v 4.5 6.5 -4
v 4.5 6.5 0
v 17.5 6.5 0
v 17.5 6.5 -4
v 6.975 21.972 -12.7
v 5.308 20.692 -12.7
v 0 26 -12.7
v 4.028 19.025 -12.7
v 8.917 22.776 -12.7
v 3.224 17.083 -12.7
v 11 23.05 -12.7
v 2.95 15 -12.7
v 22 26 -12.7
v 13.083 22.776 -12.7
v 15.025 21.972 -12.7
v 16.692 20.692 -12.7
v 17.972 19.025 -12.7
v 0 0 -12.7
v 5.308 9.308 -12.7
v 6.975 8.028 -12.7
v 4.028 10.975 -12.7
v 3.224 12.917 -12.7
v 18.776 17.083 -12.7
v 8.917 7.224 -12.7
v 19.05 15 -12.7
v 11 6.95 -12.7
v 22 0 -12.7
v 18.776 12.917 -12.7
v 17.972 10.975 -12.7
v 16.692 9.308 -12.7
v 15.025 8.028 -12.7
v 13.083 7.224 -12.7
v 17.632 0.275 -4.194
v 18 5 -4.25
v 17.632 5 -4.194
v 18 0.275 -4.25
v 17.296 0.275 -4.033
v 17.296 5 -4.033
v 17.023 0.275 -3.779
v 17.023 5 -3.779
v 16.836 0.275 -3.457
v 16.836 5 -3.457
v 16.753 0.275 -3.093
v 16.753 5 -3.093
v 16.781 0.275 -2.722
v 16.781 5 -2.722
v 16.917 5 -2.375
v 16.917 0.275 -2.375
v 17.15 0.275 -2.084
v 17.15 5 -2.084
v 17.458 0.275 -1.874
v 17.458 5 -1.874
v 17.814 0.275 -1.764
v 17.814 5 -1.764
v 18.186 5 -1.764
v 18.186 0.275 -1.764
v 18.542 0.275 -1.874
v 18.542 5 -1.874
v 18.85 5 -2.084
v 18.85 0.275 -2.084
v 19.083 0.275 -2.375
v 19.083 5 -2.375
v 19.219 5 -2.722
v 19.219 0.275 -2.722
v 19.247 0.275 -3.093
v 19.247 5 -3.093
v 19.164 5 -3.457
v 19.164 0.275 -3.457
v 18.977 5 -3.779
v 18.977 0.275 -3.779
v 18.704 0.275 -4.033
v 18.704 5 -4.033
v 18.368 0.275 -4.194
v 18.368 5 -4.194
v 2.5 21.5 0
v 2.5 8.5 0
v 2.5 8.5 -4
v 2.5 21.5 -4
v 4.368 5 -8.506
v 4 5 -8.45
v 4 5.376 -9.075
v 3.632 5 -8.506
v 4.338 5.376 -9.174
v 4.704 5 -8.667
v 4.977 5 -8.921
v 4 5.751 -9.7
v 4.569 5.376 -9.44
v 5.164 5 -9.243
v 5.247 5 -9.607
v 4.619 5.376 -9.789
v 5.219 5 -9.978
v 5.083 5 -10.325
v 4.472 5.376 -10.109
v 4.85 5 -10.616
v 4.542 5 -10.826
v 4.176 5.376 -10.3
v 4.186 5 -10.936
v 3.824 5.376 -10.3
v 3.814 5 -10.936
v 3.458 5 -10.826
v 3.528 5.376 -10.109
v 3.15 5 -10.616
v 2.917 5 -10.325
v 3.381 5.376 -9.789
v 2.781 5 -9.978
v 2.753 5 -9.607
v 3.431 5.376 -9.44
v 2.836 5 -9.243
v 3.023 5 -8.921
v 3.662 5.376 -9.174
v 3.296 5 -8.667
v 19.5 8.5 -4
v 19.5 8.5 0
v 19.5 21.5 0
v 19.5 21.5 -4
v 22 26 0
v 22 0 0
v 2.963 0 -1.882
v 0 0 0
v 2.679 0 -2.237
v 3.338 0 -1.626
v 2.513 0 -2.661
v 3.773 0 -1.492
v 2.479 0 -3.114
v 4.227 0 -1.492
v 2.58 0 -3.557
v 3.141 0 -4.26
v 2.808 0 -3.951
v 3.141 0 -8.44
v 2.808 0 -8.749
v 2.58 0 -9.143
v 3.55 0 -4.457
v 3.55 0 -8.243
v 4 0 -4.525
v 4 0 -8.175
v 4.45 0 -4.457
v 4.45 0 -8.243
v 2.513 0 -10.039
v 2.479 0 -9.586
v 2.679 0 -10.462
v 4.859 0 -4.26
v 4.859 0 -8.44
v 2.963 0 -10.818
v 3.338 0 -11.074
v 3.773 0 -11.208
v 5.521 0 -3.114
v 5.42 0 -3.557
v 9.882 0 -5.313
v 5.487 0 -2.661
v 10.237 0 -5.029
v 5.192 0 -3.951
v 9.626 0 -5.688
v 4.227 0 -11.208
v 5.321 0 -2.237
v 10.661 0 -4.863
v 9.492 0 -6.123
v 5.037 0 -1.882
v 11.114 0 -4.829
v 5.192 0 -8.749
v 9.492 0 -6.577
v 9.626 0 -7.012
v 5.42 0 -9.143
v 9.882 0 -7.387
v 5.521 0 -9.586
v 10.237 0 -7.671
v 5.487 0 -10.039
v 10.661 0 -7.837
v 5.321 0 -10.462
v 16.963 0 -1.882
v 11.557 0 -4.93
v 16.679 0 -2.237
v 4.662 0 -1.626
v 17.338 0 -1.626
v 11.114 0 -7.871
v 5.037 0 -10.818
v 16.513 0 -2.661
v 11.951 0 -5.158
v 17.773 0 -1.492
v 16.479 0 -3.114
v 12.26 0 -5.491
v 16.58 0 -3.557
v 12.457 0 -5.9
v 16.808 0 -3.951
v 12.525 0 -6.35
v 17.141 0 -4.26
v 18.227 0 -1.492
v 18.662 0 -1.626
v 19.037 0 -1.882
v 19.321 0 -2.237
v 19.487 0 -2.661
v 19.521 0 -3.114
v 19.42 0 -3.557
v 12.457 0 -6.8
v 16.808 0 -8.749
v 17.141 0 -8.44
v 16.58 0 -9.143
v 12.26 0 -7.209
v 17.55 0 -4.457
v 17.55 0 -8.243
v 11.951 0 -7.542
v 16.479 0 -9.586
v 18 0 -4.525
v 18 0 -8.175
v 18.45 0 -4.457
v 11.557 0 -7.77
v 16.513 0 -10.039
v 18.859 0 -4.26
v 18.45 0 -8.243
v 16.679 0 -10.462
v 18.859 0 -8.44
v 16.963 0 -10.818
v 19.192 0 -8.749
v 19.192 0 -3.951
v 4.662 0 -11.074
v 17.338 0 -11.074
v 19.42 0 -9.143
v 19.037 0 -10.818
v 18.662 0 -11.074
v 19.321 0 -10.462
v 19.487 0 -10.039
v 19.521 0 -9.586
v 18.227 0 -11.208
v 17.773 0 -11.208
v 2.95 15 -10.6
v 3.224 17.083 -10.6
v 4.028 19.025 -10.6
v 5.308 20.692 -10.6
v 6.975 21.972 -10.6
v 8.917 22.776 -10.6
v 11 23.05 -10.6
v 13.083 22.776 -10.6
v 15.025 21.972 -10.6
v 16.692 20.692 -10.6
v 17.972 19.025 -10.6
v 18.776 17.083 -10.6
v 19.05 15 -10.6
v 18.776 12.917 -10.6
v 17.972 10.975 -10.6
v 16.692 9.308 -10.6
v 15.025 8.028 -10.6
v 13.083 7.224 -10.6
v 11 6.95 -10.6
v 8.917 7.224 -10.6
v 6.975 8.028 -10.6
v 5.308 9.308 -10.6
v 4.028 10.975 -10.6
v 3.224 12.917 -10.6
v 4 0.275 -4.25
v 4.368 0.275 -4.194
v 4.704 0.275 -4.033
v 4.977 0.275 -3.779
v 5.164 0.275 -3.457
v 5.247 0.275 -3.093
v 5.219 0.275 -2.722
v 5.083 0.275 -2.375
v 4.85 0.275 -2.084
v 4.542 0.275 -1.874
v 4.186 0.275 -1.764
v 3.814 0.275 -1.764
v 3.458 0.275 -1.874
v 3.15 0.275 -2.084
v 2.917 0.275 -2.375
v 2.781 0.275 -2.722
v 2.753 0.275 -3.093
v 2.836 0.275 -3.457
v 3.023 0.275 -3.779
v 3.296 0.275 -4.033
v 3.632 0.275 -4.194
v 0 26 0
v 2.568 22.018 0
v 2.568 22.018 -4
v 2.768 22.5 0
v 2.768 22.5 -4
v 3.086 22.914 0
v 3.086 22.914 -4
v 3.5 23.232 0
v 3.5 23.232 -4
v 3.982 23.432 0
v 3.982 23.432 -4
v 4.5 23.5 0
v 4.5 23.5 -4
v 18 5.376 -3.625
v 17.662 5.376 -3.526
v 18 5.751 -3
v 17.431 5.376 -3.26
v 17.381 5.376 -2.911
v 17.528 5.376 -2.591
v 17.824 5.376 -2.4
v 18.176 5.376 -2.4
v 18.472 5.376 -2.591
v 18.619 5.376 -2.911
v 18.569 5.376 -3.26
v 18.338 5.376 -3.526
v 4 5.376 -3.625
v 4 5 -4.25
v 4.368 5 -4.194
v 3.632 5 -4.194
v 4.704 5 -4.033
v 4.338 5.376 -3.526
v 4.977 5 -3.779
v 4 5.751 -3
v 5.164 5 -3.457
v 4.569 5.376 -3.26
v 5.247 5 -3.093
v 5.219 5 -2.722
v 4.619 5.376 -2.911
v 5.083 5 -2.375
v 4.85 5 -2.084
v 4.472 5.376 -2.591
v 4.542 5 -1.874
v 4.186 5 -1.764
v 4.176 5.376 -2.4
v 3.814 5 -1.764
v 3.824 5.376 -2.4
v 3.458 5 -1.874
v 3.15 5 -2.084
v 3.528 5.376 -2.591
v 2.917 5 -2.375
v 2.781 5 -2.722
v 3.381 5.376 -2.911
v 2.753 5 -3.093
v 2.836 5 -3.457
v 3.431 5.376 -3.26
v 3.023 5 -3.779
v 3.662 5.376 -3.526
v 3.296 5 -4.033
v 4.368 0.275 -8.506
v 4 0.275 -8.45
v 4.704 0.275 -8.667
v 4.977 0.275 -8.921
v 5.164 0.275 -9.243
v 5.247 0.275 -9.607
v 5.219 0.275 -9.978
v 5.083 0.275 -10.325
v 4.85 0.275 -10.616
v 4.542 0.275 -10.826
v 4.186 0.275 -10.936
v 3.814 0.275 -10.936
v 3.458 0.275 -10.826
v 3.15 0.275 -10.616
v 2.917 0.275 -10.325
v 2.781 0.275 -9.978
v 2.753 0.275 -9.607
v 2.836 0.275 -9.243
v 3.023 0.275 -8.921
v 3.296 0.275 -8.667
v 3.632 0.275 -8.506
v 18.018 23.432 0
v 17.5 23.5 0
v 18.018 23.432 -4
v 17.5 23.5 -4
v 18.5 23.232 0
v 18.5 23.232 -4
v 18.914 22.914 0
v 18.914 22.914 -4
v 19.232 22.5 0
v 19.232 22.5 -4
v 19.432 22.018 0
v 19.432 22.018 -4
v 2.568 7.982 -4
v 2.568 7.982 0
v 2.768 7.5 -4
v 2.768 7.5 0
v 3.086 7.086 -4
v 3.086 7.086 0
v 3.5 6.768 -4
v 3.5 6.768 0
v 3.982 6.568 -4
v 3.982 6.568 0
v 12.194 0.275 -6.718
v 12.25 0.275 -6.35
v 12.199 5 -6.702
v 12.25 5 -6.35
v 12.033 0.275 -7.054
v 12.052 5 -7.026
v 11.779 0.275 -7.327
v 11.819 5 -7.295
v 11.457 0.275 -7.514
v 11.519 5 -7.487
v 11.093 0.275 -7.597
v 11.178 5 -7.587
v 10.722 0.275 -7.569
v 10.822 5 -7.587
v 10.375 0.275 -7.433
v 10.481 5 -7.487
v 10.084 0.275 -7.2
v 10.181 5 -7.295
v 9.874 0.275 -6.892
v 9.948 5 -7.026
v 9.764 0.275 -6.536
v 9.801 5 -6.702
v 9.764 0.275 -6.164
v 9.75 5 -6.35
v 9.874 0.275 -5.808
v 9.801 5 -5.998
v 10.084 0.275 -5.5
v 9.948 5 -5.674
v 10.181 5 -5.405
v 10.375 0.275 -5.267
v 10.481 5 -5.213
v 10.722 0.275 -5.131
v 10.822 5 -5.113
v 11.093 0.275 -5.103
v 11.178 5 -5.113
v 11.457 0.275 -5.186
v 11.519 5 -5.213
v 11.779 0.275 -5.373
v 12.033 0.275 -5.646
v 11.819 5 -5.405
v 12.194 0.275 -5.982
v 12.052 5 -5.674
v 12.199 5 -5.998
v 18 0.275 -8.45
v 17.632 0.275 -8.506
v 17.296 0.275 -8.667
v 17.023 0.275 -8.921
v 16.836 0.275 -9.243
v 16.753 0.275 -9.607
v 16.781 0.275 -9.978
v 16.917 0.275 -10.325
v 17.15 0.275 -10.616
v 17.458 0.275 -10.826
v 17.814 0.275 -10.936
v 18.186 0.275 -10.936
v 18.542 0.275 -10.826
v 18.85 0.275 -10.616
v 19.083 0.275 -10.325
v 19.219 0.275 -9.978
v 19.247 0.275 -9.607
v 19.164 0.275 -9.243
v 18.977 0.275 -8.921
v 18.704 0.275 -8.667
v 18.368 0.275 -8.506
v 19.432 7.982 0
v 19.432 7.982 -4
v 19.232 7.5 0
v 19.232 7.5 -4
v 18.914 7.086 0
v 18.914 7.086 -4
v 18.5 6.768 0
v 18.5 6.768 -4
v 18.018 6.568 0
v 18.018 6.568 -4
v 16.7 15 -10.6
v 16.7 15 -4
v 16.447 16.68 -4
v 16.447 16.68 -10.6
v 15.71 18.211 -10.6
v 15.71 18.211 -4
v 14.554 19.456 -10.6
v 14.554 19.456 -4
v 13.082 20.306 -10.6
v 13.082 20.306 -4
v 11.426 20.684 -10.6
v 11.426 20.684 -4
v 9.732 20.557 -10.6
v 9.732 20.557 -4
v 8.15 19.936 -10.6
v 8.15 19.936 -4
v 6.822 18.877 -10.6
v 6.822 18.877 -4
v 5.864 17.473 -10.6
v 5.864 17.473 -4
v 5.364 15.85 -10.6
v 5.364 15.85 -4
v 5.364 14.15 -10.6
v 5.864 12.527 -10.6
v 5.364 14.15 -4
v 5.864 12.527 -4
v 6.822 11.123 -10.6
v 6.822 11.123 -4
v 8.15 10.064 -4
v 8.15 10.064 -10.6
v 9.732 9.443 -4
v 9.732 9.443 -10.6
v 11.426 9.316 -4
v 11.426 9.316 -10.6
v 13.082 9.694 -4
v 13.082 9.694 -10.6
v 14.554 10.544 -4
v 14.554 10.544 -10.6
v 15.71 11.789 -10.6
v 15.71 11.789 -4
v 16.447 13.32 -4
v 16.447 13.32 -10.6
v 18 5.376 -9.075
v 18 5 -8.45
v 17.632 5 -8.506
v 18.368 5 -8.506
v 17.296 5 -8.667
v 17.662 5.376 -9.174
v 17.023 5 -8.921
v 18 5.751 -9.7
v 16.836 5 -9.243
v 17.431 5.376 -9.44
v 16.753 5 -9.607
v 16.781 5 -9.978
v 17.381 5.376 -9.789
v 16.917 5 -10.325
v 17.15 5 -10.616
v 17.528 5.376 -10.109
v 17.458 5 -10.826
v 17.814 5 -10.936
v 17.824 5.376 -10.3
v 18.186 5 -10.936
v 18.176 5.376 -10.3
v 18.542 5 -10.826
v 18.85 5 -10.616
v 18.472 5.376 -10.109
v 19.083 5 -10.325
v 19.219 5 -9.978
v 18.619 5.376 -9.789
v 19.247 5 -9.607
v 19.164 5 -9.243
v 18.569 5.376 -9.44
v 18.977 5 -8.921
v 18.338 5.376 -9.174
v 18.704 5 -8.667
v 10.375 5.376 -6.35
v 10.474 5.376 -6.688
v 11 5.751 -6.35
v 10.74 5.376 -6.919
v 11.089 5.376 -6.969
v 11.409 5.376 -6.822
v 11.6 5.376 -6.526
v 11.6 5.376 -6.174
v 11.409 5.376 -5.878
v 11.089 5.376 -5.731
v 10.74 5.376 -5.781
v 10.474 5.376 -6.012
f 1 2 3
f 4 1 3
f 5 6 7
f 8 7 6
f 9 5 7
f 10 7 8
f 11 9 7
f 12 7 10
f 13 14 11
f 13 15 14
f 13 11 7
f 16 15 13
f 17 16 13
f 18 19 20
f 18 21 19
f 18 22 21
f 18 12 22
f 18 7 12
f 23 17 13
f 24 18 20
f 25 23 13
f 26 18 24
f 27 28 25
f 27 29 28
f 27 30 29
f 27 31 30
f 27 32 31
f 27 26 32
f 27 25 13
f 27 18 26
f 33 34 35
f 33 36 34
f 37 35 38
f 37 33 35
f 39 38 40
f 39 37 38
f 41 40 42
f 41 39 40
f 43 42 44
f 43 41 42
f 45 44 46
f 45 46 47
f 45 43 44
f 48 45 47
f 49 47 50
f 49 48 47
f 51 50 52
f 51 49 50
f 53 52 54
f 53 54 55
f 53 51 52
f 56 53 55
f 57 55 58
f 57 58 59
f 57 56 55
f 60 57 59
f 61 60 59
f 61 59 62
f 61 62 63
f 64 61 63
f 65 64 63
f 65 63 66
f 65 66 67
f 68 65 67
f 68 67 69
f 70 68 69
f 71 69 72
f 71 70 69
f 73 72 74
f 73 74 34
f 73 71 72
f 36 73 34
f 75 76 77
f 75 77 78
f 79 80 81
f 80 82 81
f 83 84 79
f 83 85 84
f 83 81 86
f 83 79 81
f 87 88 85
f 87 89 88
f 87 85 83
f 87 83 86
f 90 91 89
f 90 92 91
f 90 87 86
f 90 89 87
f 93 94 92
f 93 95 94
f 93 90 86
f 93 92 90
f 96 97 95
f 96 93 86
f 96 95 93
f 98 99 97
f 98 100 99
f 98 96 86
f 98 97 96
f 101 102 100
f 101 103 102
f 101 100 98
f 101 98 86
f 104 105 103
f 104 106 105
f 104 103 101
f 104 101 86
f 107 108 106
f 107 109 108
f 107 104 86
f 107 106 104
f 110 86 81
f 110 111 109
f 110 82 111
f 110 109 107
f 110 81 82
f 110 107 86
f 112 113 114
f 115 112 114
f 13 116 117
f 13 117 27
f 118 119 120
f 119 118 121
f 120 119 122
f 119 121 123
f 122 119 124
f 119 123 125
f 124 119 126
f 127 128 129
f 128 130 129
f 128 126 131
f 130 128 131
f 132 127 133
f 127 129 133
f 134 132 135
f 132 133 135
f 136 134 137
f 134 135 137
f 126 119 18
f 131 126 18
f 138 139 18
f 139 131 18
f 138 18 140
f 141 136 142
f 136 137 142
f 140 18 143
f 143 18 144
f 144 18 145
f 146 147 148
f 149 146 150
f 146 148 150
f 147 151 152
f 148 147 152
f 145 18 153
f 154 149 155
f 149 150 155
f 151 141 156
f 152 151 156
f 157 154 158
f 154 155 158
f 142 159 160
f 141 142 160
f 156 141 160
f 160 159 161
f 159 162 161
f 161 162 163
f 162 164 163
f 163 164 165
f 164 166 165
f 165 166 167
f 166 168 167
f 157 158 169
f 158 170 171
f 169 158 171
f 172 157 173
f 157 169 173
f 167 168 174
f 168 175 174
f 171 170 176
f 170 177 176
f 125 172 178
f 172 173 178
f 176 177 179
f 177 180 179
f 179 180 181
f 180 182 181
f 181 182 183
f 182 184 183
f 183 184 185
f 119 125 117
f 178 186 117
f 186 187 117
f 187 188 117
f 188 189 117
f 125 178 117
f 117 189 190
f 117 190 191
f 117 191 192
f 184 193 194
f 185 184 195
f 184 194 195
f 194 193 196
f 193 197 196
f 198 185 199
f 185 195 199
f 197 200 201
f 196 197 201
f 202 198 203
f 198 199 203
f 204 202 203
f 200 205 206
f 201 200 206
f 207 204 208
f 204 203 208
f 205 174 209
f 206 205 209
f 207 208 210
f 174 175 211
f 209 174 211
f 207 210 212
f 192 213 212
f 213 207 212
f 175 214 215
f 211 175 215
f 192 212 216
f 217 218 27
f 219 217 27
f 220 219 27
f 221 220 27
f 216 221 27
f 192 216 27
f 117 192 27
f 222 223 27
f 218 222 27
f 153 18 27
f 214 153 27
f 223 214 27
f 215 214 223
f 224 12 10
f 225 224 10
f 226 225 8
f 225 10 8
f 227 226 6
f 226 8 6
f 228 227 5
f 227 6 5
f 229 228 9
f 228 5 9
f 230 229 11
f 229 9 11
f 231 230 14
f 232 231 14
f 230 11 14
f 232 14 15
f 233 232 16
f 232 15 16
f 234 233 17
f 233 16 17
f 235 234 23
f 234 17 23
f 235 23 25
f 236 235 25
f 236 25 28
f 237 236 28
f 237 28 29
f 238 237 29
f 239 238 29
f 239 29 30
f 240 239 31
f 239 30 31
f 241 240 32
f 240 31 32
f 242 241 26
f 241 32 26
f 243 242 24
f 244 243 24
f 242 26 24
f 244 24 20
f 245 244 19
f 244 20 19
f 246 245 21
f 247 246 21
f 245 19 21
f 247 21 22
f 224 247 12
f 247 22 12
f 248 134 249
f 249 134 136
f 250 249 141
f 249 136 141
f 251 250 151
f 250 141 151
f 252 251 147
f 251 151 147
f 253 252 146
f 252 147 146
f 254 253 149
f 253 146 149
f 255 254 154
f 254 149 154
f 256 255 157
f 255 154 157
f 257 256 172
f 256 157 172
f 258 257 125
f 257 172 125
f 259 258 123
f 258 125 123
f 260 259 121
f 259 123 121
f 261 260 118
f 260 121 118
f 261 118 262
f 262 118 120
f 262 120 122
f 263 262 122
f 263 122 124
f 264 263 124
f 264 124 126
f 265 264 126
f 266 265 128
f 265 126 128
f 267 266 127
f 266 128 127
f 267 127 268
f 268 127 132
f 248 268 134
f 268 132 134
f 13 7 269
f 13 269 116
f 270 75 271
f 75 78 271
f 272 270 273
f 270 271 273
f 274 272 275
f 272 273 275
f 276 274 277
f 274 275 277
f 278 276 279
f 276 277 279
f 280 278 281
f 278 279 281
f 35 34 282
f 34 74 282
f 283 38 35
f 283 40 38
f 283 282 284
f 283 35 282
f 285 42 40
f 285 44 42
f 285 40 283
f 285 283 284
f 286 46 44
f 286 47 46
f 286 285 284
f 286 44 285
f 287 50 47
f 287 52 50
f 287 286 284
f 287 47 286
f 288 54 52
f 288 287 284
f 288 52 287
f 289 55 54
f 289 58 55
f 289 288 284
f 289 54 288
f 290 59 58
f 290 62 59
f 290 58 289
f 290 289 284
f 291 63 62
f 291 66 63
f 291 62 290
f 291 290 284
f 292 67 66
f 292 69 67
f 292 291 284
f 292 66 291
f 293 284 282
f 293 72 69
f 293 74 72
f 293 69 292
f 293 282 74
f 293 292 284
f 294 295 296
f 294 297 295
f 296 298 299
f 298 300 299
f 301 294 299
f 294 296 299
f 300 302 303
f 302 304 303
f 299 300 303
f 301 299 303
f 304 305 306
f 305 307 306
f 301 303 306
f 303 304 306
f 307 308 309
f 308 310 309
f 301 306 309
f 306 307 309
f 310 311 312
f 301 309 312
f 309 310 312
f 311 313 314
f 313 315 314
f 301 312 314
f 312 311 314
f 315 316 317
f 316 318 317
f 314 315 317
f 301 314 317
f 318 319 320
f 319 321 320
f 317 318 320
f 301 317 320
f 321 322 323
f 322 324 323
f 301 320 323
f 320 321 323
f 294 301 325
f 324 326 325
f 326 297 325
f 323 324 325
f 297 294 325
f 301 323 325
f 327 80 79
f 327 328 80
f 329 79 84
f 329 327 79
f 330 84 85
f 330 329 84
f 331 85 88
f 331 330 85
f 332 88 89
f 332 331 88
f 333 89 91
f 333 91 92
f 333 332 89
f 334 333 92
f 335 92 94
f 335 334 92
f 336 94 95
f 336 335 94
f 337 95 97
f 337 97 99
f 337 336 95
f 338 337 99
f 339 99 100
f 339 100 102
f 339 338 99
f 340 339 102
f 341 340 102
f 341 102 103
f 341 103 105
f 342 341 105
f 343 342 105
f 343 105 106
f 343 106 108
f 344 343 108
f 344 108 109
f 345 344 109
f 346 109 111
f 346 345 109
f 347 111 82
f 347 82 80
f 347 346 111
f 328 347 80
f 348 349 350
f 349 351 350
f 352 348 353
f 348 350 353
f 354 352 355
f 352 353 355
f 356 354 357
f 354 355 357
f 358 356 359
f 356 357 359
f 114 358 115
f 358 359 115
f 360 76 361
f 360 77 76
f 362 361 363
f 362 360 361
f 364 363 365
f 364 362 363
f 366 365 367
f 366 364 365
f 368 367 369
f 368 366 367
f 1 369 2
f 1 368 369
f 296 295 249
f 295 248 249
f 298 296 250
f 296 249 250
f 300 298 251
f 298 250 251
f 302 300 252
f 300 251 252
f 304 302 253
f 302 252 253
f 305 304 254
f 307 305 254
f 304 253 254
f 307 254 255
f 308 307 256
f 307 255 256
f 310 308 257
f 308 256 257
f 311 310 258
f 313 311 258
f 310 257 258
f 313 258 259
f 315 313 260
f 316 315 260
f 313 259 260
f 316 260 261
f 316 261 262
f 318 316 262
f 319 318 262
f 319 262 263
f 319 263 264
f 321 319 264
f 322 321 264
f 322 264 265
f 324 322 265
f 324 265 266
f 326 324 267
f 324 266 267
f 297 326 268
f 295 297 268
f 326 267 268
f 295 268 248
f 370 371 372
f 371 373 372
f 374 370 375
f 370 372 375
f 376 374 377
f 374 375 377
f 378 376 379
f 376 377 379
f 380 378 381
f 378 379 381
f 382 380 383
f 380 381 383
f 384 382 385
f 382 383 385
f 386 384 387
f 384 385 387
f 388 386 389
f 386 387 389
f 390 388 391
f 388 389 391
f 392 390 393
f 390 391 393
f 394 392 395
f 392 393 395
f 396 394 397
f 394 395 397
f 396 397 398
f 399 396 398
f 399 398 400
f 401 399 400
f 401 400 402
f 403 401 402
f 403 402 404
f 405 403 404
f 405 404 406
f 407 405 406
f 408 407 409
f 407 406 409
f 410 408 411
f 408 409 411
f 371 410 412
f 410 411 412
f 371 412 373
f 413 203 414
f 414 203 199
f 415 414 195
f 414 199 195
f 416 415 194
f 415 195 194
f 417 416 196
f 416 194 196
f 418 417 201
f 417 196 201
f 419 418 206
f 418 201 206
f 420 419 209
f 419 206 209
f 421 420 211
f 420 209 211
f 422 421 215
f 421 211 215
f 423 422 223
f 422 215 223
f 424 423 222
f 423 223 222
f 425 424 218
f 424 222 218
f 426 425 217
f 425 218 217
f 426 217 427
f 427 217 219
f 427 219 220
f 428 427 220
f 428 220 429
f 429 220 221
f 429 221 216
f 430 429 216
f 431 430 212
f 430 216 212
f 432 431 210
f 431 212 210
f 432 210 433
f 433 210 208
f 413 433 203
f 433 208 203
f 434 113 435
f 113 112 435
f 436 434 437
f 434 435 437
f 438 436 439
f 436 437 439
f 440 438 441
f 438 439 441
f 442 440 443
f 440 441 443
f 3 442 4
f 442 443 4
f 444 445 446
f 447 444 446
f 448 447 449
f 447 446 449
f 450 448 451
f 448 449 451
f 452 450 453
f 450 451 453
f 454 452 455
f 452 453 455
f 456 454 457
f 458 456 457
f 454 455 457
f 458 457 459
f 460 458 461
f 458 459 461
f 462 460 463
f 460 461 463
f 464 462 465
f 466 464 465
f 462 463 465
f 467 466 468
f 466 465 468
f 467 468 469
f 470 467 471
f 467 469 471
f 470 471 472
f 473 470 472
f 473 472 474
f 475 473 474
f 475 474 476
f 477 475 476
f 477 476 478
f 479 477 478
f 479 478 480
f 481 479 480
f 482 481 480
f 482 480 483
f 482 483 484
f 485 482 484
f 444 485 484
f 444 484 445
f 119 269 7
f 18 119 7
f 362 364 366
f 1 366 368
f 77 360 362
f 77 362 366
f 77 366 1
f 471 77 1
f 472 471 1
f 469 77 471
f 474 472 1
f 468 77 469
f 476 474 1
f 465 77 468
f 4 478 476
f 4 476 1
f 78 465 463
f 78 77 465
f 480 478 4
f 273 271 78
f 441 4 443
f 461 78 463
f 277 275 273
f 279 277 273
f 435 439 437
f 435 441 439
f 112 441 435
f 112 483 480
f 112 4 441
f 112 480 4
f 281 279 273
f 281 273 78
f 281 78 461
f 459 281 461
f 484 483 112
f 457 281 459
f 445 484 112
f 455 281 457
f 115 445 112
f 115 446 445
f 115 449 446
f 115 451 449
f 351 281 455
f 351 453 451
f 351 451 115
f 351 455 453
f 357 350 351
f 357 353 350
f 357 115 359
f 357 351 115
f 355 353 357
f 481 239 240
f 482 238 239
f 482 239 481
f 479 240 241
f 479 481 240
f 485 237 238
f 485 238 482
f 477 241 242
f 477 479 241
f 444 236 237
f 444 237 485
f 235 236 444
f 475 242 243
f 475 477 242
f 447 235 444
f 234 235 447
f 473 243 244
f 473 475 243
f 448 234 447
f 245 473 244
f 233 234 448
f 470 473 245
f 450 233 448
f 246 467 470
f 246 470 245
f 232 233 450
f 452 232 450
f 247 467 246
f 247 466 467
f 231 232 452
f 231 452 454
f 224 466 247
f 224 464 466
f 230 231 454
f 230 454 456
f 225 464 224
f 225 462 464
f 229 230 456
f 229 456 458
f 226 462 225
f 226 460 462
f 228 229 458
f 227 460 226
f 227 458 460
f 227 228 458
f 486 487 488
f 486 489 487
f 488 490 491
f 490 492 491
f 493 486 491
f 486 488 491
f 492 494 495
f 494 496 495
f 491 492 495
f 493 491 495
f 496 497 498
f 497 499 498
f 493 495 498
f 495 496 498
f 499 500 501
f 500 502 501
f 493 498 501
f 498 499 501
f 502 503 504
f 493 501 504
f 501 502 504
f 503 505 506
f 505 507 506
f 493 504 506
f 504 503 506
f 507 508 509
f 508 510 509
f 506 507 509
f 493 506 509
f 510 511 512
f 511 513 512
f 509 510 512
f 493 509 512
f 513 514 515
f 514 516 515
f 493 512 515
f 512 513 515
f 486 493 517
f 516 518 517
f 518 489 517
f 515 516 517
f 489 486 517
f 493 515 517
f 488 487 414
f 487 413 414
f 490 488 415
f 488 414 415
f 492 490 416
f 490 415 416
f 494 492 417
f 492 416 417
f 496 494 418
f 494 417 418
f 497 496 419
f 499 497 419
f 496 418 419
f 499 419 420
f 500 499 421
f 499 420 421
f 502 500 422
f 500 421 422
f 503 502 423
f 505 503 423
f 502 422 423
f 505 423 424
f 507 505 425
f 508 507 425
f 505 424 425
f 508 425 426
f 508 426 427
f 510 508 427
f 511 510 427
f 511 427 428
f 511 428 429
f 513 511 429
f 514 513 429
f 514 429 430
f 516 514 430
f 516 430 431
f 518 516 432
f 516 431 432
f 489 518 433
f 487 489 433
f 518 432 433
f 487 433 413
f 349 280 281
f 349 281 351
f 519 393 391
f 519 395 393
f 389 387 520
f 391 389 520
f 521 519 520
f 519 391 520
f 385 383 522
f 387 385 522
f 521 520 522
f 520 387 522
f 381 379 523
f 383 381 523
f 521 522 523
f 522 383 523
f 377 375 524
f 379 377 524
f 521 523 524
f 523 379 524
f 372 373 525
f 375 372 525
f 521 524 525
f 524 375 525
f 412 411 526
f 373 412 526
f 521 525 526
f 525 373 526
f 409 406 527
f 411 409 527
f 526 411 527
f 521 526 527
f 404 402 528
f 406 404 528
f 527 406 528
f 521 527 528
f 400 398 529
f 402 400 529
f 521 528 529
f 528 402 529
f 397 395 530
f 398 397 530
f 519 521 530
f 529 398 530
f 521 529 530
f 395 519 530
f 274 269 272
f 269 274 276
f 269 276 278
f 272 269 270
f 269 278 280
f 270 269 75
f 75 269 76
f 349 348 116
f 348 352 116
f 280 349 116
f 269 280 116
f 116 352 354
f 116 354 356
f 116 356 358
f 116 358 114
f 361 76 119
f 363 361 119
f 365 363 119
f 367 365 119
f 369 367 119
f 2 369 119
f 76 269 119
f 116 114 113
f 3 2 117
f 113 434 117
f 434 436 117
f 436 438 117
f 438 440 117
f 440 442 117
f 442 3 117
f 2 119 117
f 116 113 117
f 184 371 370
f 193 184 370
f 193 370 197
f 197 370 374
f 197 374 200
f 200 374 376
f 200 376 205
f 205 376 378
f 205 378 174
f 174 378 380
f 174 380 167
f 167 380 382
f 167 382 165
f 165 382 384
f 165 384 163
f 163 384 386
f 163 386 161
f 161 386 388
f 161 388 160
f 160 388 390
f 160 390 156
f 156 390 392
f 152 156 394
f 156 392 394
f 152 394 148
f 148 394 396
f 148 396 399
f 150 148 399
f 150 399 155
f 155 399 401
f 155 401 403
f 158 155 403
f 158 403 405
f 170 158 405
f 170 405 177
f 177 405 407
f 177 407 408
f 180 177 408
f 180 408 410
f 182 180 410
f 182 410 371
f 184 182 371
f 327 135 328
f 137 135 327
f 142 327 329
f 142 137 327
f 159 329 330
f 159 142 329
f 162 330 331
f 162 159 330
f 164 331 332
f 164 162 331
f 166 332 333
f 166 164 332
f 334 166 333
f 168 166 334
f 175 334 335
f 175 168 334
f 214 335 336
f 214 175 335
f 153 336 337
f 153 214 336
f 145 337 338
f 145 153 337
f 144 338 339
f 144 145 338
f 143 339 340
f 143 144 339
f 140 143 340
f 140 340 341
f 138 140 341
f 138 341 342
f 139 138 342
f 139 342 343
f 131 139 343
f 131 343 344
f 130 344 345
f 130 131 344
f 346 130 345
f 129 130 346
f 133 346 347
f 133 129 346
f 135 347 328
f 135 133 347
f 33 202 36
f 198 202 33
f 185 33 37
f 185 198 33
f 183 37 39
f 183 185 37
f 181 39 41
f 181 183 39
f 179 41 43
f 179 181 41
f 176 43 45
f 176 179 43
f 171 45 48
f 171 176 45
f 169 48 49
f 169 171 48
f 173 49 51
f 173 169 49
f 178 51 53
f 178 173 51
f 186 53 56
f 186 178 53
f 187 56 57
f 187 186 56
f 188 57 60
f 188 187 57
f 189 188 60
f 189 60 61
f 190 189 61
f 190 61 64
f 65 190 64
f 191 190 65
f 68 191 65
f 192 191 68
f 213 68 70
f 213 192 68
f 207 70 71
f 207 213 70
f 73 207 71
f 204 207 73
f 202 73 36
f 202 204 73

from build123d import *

# Parameters (mm, degrees)
SKETCH1_W                       = 22
SKETCH1_H                       = 12.7
BOSS_EXTRUDE1_DEPTH             = 26
M3X0_5_TAPPED_HOLE2_D           = 2.5
M3X0_5_TAPPED_HOLE2_DEPTH       = 5
M3X0_5_TAPPED_HOLE2_CSINK_D     = 3.05
M3X0_5_TAPPED_HOLE2_CSINK_ANGLE = 90
M3X0_5_TAPPED_HOLE2_TIP         = 0.751075774
SKETCH7_R                       = 5.7
CUT_EXTRUDE1_DEPTH              = 13.7
SKETCH8_W                       = 17
SKETCH8_H                       = 17
CUT_EXTRUDE2_DEPTH              = 4
FILLET1_R                       = 2
SKETCH9_R                       = 8.05
CUT_EXTRUDE3_DEPTH              = 2.1


with BuildPart() as part:
    # Sketch1 → Boss-Extrude1 (new body)
    with BuildSketch(Plane(origin=(0, 0, 0), x_dir=(1, 0, 0), z_dir=(0, 1, 0))):
        with Locations((11, 6.35)):
            Rectangle(SKETCH1_W, SKETCH1_H)
    extrude(amount=BOSS_EXTRUDE1_DEPTH)

    # Sketch2 → M3x0.5 Tapped Hole1 (revolve, cut)
    with BuildSketch(Plane(origin=(18, 0, -3), x_dir=(0, 0, -1), z_dir=(1, 0, 0))):
        Polygon((0, 0), (0, 5.751075774), (1.25, 5), (1.25, 0.275), (1.525, 0), align=None)
    m3x0_5_tapped_hole1 = revolve(axis=Axis((18, -6.35, -3), (0, 1, 0)), mode=Mode.SUBTRACT)

    # Mirror1: M3x0.5 Tapped Hole1 across plane
    add(m3x0_5_tapped_hole1.mirror(Plane.XY.offset(-6.35)), mode=Mode.SUBTRACT)

    # Mirror2: M3x0.5 Tapped Hole1 across plane
    add(m3x0_5_tapped_hole1.mirror(Plane(origin=(11, 0, 0), x_dir=(0, 0, 1), z_dir=(1, 0, 0))), mode=Mode.SUBTRACT)

    # Mirror2 copy 1 sketch → Mirror2 copy 1 (revolve, cut)
    with BuildSketch(Plane(origin=(4, 0, -9.7), x_dir=(0, 0, 1), z_dir=(-1, 0, 0))):
        Polygon((0, 0), (0, 5.751075774), (1.25, 5), (1.25, 0.275), (1.525, 0), align=None)
    revolve(axis=Axis((4, -6.35, -9.7), (0, 1, 0)), mode=Mode.SUBTRACT)

    # M3x0.5 Tapped Hole2
    with Locations(Plane(origin=(0, 0, 0), x_dir=(-1, 0, 0), z_dir=(0, -1, 0))):
        with Locations((-11, 6.35)):
            CounterSinkHole(M3X0_5_TAPPED_HOLE2_D / 2, M3X0_5_TAPPED_HOLE2_CSINK_D / 2, depth=M3X0_5_TAPPED_HOLE2_DEPTH, counter_sink_angle=M3X0_5_TAPPED_HOLE2_CSINK_ANGLE)
            with Locations((0, 0, -(M3X0_5_TAPPED_HOLE2_DEPTH + M3X0_5_TAPPED_HOLE2_TIP / 2))):  # 118° drill point
                Cone(0, M3X0_5_TAPPED_HOLE2_D / 2, M3X0_5_TAPPED_HOLE2_TIP, mode=Mode.SUBTRACT)

    # Sketch7 → Cut-Extrude1 (cut, through all)
    with BuildSketch(Plane.XY):
        with Locations((11, 15)):
            Circle(SKETCH7_R)
    extrude(amount=-CUT_EXTRUDE1_DEPTH, mode=Mode.SUBTRACT)

    # Sketch8 → Cut-Extrude2 (cut)
    with BuildSketch(Plane.XY):
        with Locations((11, 15)):
            Rectangle(SKETCH8_W, SKETCH8_H)
    extrude(amount=-CUT_EXTRUDE2_DEPTH, mode=Mode.SUBTRACT)

    # Fillet1
    fillet1_edges = [part.edges().sort_by_distance(p)[0] for p in [
        (2.5, 6.5, -2),
        (2.5, 23.5, -2),
        (19.5, 23.5, -2),
        (19.5, 6.5, -2),
    ]]
    fillet(fillet1_edges, radius=FILLET1_R)

    # Sketch9 → Cut-Extrude3 (cut)
    with BuildSketch(Plane(origin=(0, 0, -12.7), x_dir=(-1, 0, 0), z_dir=(0, 0, -1))):
        with Locations((-11, 15)):
            Circle(SKETCH9_R)
    extrude(amount=-CUT_EXTRUDE3_DEPTH, mode=Mode.SUBTRACT)


solid = part.part
